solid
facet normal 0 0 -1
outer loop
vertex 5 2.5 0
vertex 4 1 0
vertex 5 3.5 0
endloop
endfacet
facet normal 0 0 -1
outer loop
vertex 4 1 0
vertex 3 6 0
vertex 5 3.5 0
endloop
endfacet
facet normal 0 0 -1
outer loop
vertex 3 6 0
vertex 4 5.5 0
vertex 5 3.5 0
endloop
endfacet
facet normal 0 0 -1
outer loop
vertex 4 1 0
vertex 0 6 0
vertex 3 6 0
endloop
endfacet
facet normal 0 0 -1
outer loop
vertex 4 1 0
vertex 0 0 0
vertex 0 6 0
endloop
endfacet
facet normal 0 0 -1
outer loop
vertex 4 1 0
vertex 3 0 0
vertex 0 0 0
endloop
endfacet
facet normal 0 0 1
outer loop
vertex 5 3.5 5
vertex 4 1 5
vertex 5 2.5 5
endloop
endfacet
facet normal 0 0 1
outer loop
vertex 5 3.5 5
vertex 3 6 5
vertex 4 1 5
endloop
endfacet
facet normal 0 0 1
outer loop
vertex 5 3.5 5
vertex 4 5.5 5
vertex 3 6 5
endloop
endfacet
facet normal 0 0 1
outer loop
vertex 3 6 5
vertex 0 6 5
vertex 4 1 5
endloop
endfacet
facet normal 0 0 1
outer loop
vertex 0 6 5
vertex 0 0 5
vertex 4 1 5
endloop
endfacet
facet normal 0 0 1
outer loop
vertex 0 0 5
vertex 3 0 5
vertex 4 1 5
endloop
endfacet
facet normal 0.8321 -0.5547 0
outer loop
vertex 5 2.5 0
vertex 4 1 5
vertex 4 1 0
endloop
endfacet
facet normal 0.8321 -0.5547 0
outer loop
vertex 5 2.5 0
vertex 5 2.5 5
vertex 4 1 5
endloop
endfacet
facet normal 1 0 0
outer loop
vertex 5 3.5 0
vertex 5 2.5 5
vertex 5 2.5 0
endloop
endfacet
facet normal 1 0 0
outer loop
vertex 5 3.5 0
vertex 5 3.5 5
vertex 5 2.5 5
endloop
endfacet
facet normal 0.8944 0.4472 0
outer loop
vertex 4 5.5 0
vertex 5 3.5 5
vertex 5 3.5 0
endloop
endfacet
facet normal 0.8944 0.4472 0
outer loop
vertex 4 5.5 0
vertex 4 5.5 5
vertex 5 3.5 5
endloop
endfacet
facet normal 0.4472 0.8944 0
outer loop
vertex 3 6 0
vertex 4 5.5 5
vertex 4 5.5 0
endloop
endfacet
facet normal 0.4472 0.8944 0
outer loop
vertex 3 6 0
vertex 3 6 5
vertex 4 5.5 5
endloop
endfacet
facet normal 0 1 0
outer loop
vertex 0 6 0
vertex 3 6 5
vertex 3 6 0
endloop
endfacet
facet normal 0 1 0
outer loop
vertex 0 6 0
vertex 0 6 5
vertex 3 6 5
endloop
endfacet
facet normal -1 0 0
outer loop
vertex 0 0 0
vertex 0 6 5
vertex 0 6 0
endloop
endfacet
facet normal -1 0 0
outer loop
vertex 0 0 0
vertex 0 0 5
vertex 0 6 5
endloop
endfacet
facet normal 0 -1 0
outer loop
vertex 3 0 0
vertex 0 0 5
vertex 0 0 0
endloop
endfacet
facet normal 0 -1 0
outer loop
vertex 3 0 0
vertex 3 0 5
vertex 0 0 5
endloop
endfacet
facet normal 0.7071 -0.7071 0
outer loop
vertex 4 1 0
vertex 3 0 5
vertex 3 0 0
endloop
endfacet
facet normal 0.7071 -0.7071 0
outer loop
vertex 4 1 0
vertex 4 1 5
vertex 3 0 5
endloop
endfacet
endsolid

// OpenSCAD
module ConvertTaperIcon () {
     w = 3;
     points = [
          [0, 0],
          [w, 0],
          [w+1, 1],
          [w+2, 2.5],
          [w+2, 3.5],
          [w+1, 5.5],
          [w, 6],
          [0, 6],
     ];
     linear_extrude(height = 5) polygon(points);
}

ConvertTaperIcon();
